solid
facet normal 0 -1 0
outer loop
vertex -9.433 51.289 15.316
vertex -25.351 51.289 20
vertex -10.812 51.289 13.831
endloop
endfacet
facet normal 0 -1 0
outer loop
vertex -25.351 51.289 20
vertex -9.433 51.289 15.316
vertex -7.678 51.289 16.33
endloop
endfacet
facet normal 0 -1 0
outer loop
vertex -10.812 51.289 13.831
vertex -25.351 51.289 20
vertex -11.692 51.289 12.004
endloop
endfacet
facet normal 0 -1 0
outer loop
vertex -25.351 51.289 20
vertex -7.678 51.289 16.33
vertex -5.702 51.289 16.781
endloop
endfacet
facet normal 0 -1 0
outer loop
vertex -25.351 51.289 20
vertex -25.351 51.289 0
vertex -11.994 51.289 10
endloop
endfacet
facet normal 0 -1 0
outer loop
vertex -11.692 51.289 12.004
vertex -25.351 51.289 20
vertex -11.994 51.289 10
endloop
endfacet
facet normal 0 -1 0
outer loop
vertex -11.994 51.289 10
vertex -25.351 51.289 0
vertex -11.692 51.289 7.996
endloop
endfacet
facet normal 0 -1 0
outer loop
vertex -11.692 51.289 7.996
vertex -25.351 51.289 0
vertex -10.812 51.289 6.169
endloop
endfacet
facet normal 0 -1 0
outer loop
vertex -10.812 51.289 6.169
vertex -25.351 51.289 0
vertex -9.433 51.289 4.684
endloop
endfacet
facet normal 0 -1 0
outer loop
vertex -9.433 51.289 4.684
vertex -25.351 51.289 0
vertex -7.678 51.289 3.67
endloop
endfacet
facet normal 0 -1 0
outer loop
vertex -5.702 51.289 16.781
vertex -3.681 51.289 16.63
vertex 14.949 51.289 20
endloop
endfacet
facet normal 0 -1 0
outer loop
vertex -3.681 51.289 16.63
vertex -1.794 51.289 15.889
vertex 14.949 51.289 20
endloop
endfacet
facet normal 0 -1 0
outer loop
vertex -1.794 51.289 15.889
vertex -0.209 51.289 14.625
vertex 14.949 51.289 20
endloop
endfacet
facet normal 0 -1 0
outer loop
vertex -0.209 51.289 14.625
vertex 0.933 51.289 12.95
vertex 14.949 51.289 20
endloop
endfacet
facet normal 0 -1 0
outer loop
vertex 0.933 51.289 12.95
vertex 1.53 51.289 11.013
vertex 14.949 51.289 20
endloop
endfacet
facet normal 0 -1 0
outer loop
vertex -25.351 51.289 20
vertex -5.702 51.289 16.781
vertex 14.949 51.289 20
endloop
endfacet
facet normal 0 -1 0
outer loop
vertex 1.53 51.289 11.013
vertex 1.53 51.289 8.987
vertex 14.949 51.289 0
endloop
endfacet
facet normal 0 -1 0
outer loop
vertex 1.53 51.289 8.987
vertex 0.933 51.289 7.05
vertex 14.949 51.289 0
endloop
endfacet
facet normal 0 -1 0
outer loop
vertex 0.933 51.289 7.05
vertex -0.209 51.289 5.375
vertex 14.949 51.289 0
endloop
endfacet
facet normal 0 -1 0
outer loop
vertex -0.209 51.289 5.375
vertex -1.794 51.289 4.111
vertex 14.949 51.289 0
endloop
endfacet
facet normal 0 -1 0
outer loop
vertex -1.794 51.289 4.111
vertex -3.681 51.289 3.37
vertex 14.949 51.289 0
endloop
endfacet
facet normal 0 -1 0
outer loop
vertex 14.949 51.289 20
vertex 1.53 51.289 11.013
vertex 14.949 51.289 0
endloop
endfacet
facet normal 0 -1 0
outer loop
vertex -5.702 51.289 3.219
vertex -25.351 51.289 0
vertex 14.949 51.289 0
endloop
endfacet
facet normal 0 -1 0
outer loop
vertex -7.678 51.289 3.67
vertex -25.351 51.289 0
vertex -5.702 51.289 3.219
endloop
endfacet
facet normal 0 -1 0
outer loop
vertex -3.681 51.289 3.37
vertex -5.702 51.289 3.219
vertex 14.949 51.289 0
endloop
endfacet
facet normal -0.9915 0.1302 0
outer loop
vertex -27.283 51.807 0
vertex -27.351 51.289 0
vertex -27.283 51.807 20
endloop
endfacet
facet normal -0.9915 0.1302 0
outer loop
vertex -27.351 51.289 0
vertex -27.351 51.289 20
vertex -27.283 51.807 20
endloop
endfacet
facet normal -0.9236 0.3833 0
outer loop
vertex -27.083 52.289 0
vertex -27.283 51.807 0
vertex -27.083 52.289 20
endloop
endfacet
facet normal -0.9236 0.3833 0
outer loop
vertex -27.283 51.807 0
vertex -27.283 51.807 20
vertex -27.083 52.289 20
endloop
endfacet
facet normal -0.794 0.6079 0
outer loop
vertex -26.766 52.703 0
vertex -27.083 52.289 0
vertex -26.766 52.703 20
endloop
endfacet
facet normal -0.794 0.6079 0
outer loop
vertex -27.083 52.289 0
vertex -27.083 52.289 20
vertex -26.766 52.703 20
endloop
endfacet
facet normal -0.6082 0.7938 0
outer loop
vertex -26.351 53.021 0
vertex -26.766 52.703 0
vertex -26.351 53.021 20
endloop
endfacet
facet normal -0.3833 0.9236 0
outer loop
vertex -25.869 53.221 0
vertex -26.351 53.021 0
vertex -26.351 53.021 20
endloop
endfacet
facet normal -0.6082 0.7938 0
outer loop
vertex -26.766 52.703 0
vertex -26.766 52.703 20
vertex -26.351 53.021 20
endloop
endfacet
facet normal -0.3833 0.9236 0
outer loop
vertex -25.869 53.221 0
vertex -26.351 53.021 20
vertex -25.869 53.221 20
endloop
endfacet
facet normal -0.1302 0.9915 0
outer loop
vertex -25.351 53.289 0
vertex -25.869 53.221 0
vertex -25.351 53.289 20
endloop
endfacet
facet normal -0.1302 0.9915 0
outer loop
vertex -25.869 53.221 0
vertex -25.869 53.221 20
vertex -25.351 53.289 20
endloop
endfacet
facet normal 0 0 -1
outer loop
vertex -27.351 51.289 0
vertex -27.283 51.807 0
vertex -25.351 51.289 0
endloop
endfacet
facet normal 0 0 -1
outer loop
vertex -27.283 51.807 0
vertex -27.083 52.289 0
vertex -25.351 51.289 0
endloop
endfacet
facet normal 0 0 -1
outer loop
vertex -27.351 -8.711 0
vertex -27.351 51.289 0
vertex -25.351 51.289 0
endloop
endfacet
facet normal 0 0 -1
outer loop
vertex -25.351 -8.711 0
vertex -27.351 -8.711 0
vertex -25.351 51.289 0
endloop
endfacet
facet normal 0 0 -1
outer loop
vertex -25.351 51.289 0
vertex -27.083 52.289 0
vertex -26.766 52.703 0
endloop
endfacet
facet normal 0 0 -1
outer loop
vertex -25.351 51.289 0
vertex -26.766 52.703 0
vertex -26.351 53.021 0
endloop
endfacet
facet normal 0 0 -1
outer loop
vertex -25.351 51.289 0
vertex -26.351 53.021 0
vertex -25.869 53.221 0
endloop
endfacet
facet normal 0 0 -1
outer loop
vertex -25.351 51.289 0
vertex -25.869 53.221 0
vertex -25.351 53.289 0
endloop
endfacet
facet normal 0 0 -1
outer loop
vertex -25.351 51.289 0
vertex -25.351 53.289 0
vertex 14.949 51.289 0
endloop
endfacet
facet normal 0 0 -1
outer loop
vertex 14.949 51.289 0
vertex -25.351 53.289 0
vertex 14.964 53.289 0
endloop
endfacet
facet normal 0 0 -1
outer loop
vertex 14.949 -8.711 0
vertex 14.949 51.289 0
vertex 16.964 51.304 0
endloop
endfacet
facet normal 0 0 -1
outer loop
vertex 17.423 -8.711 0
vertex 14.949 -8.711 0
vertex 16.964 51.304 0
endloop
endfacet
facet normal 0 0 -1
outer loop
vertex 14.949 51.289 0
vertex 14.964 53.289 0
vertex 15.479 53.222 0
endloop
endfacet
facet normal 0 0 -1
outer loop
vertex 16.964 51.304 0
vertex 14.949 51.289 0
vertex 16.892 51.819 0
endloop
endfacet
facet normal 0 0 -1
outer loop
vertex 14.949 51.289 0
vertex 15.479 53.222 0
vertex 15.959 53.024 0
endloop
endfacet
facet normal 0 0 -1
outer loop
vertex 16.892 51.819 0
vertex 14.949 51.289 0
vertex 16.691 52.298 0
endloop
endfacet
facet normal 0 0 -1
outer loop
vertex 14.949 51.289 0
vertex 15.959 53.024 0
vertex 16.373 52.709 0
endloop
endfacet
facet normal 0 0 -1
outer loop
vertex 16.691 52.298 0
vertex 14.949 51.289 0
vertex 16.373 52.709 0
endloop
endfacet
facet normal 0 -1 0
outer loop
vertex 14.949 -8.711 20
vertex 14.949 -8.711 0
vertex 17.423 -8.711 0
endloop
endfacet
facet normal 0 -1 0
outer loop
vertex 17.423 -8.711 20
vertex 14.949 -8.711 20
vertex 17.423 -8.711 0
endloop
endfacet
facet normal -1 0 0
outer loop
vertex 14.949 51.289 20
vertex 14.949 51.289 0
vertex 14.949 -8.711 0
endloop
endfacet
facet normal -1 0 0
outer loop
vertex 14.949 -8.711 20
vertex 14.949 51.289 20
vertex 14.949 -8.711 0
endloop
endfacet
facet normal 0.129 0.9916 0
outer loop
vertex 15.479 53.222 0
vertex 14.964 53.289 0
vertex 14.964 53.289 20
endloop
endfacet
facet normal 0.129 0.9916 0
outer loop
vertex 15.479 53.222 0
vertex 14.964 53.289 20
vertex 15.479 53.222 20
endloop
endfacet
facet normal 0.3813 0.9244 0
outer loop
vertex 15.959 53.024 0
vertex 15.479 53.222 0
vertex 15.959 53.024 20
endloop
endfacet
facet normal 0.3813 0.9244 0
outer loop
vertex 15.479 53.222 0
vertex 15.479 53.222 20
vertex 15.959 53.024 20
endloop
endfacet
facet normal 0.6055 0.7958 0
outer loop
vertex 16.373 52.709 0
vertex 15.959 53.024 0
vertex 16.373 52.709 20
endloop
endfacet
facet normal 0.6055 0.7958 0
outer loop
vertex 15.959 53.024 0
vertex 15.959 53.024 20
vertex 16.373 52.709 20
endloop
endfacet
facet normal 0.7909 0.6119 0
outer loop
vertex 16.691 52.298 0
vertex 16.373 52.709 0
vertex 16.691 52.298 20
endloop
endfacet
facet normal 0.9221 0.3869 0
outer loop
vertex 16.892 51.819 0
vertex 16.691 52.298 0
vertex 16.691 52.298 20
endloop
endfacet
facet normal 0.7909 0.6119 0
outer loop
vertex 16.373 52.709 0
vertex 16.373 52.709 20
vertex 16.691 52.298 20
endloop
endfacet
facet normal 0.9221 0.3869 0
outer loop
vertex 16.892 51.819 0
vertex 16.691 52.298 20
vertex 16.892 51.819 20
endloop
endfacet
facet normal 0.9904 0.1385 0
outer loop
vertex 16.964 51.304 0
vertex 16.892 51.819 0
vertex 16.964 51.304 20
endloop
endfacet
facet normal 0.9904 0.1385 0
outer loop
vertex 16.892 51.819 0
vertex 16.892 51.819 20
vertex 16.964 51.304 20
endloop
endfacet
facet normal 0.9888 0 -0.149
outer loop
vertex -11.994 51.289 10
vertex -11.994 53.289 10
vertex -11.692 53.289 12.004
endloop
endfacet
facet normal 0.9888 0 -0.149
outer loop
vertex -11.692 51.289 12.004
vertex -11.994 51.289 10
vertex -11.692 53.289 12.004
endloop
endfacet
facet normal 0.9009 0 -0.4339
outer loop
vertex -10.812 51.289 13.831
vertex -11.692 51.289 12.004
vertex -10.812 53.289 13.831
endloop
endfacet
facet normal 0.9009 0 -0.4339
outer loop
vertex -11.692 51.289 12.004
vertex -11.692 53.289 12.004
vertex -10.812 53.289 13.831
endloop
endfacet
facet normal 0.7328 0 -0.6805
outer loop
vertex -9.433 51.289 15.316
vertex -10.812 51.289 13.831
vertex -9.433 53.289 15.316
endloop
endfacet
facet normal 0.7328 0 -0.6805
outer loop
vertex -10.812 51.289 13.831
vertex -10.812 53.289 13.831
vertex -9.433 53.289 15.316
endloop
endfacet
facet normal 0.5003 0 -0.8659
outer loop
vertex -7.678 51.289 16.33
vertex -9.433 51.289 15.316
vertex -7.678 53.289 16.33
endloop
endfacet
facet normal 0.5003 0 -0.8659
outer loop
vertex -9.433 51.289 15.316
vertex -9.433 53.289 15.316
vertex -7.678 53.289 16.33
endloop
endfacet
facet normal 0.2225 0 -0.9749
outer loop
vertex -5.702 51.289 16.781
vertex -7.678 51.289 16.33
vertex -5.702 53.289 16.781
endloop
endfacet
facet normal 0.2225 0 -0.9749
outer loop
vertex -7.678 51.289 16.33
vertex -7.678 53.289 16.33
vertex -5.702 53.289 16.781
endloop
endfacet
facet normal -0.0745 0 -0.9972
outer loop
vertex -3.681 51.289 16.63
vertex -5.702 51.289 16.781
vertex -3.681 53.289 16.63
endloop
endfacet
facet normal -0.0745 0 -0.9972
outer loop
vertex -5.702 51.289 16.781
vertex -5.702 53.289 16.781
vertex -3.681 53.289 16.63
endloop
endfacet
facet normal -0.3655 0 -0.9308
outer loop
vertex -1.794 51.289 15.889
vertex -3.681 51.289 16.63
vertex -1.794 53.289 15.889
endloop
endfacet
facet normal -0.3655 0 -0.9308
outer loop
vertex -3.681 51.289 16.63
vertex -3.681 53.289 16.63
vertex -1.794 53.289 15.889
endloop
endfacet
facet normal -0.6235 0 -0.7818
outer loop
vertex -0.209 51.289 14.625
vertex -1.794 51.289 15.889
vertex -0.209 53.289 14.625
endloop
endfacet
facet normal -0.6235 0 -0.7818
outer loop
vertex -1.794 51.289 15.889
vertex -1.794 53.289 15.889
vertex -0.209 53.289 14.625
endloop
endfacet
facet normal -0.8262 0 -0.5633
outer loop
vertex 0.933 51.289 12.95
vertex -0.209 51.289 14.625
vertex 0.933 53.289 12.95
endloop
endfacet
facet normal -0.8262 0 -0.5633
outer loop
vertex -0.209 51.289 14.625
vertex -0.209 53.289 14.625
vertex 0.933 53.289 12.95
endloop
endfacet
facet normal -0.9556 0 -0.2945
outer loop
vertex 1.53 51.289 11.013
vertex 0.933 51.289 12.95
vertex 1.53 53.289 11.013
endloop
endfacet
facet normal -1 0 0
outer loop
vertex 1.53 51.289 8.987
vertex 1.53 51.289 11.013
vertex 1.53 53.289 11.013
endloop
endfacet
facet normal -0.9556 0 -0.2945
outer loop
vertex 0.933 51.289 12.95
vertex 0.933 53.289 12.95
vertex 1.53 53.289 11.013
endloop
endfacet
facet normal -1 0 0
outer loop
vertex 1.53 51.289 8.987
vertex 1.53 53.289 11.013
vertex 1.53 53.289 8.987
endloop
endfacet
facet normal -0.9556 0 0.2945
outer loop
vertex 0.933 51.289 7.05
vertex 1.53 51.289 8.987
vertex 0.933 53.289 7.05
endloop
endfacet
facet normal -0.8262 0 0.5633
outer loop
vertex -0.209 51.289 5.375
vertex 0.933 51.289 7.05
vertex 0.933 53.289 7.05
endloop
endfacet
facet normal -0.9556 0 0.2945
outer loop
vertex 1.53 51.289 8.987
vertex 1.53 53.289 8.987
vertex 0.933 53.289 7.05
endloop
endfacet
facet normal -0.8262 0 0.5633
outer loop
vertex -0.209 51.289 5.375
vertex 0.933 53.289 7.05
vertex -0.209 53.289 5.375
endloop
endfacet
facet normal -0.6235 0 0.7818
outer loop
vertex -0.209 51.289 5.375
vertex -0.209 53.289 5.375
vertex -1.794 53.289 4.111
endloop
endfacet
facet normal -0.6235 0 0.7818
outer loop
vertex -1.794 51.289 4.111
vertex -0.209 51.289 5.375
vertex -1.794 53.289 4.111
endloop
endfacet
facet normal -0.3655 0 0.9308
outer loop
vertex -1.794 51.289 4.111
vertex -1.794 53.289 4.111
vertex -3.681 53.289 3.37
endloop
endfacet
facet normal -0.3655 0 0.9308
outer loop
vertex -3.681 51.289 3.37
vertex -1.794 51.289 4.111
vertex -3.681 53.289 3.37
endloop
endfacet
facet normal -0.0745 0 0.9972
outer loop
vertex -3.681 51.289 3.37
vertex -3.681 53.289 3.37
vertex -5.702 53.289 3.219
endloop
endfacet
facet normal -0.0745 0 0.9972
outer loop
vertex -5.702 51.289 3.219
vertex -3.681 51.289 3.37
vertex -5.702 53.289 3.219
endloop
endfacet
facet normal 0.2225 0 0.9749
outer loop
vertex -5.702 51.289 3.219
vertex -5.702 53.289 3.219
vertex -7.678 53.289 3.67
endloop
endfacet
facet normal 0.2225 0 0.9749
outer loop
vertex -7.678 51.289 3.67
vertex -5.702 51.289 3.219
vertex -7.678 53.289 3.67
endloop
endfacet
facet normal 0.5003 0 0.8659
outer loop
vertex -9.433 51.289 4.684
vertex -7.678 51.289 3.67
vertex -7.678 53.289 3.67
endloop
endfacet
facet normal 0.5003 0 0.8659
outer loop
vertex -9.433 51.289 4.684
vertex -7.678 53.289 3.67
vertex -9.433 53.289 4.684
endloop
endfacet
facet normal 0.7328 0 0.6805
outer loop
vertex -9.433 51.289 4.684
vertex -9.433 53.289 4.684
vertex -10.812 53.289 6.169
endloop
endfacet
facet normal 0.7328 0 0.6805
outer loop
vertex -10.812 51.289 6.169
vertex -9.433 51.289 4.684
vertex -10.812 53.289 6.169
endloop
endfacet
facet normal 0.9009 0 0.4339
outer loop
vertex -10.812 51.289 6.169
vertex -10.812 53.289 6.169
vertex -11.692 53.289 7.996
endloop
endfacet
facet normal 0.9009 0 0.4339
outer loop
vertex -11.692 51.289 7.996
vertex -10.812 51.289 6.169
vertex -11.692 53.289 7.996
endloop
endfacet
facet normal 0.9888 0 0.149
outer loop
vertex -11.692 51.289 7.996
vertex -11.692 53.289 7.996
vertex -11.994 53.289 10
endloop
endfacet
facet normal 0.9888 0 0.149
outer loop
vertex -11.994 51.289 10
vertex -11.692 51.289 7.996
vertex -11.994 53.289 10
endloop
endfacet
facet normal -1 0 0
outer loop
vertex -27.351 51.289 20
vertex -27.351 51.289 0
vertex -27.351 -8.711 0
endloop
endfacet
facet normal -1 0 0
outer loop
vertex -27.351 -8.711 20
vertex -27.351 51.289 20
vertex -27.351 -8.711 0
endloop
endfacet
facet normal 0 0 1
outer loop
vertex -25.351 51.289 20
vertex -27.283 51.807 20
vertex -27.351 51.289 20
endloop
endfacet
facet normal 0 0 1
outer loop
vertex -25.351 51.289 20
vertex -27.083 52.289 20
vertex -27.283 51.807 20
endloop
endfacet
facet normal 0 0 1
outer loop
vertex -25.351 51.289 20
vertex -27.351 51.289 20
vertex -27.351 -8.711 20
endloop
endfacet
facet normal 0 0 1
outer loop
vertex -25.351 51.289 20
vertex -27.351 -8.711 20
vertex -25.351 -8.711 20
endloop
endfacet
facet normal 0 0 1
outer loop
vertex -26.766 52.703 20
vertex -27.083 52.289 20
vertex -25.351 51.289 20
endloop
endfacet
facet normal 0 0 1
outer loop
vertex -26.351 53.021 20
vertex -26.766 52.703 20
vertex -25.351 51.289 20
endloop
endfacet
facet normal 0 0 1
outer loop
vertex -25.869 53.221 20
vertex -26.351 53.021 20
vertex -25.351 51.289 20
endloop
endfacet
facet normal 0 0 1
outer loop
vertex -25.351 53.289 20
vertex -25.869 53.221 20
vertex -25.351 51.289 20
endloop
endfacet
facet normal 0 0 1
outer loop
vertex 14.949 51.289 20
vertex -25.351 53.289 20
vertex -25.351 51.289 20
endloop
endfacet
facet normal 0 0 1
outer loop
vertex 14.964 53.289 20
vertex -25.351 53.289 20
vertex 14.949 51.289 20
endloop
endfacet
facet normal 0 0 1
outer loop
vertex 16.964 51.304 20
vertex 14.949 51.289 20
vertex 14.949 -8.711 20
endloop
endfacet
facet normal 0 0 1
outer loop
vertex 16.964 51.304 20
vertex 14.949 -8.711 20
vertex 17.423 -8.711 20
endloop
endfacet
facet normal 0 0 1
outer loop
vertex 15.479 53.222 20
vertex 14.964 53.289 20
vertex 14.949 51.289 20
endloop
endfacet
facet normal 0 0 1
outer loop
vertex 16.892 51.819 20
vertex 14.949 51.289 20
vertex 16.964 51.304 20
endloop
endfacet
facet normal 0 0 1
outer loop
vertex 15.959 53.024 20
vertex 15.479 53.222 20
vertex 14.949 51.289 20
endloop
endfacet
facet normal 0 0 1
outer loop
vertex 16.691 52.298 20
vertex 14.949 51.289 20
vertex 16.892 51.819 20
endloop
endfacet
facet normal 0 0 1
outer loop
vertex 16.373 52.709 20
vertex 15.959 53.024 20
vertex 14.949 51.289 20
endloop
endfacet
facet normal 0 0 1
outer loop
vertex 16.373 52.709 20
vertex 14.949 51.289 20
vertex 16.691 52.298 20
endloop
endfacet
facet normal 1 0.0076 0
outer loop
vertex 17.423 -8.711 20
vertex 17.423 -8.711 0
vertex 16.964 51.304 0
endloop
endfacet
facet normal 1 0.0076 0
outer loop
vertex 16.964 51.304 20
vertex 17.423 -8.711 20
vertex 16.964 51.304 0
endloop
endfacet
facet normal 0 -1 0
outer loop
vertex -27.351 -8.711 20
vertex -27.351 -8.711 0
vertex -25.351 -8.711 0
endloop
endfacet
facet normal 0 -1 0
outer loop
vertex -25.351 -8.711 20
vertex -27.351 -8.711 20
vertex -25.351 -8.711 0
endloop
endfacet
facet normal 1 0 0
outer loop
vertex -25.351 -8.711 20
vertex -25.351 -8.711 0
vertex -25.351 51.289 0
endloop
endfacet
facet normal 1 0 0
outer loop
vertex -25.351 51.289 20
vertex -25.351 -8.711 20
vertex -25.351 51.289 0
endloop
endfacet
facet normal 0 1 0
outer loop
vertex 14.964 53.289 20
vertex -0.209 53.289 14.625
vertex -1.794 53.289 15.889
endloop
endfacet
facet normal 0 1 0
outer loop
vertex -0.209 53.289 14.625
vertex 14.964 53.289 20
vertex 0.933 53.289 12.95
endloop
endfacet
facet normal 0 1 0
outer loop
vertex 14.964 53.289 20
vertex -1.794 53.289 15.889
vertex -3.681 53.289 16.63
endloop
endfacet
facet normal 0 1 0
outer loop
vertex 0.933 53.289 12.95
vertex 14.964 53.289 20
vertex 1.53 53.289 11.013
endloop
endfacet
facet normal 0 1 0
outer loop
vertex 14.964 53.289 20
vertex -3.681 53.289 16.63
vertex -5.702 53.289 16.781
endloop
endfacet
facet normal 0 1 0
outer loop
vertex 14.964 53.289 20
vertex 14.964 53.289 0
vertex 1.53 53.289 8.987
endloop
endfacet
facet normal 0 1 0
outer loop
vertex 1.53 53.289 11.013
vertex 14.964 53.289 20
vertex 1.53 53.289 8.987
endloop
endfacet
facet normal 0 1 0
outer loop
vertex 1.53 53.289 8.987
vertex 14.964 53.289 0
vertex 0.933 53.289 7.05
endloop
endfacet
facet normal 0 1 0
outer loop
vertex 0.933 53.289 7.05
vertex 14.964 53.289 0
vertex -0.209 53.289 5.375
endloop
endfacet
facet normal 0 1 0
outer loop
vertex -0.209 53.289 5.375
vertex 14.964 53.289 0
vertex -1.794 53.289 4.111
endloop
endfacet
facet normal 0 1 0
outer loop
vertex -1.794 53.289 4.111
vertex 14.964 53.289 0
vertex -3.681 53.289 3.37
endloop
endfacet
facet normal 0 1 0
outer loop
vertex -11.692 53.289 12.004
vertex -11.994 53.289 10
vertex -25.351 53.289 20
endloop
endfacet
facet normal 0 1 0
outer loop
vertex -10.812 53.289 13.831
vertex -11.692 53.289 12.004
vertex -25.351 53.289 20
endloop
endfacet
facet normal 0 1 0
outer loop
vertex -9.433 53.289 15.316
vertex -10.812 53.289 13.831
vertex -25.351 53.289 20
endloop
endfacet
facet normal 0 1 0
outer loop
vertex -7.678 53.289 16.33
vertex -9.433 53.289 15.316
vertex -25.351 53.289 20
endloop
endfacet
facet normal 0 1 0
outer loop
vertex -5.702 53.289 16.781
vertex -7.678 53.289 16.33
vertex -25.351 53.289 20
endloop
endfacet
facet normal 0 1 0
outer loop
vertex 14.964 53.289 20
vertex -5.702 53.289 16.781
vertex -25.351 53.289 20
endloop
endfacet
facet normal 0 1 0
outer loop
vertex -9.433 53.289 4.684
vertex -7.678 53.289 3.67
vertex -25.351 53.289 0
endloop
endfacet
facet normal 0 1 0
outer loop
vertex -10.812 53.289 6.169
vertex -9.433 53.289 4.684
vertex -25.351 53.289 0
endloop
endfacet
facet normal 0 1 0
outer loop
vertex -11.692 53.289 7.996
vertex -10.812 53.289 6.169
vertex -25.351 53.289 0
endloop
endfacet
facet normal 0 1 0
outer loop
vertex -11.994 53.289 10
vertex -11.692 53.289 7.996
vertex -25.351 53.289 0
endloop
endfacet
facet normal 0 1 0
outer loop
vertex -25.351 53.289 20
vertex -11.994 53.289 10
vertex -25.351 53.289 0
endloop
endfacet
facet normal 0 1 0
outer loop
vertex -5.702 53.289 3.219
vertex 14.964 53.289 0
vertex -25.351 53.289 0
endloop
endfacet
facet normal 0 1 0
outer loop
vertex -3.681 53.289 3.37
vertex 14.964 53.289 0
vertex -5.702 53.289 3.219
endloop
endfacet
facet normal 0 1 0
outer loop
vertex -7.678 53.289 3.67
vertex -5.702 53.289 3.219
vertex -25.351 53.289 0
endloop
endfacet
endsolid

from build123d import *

# Parameters (mm, degrees)
EXTRUDE_1_DEPTH     = 20
FILLET_2_R          = 2
FILLET_4_R          = 2
SKETCH_2_R          = 6.8
CUT_EXTRUDE_2_DEPTH = 20


with BuildPart() as part:
    # 草图1 → 凸台-拉伸1 (new body)
    with BuildSketch(Plane.XY):
        Polygon((-27.351383791, 53.289188169), (-27.351383791, -8.710811831), (-25.351383791, -8.710811831), (-25.351383791, 51.289188169), (14.948616209, 51.289188169), (14.948616209, -8.710811831), (17.423079102, -8.710811831), (16.948616209, 53.289188169), align=None)
    extrude(amount=EXTRUDE_1_DEPTH)

    # 圆角2
    fillet_2_edges = [part.edges().sort_by_distance(p)[0] for p in [
        (-27.351383791, 53.289188169, 10),
    ]]
    fillet(fillet_2_edges, radius=FILLET_2_R)

    # 圆角4
    fillet_4_edges = [part.edges().sort_by_distance(p)[0] for p in [
        (16.948616209, 53.289188169, 10),
    ]]
    fillet(fillet_4_edges, radius=FILLET_4_R)

    # 草图2 → 切除-拉伸2 (cut)
    with BuildSketch(Plane(origin=(0, 53.289188169, 0), x_dir=(1, 0, 0), z_dir=(0, 1, 0))):
        with Locations(Location((-5.193760445, -10, 0), (0, 0, 180))):
            Circle(SKETCH_2_R)
    extrude(amount=-CUT_EXTRUDE_2_DEPTH, mode=Mode.SUBTRACT)


solid = part.part
